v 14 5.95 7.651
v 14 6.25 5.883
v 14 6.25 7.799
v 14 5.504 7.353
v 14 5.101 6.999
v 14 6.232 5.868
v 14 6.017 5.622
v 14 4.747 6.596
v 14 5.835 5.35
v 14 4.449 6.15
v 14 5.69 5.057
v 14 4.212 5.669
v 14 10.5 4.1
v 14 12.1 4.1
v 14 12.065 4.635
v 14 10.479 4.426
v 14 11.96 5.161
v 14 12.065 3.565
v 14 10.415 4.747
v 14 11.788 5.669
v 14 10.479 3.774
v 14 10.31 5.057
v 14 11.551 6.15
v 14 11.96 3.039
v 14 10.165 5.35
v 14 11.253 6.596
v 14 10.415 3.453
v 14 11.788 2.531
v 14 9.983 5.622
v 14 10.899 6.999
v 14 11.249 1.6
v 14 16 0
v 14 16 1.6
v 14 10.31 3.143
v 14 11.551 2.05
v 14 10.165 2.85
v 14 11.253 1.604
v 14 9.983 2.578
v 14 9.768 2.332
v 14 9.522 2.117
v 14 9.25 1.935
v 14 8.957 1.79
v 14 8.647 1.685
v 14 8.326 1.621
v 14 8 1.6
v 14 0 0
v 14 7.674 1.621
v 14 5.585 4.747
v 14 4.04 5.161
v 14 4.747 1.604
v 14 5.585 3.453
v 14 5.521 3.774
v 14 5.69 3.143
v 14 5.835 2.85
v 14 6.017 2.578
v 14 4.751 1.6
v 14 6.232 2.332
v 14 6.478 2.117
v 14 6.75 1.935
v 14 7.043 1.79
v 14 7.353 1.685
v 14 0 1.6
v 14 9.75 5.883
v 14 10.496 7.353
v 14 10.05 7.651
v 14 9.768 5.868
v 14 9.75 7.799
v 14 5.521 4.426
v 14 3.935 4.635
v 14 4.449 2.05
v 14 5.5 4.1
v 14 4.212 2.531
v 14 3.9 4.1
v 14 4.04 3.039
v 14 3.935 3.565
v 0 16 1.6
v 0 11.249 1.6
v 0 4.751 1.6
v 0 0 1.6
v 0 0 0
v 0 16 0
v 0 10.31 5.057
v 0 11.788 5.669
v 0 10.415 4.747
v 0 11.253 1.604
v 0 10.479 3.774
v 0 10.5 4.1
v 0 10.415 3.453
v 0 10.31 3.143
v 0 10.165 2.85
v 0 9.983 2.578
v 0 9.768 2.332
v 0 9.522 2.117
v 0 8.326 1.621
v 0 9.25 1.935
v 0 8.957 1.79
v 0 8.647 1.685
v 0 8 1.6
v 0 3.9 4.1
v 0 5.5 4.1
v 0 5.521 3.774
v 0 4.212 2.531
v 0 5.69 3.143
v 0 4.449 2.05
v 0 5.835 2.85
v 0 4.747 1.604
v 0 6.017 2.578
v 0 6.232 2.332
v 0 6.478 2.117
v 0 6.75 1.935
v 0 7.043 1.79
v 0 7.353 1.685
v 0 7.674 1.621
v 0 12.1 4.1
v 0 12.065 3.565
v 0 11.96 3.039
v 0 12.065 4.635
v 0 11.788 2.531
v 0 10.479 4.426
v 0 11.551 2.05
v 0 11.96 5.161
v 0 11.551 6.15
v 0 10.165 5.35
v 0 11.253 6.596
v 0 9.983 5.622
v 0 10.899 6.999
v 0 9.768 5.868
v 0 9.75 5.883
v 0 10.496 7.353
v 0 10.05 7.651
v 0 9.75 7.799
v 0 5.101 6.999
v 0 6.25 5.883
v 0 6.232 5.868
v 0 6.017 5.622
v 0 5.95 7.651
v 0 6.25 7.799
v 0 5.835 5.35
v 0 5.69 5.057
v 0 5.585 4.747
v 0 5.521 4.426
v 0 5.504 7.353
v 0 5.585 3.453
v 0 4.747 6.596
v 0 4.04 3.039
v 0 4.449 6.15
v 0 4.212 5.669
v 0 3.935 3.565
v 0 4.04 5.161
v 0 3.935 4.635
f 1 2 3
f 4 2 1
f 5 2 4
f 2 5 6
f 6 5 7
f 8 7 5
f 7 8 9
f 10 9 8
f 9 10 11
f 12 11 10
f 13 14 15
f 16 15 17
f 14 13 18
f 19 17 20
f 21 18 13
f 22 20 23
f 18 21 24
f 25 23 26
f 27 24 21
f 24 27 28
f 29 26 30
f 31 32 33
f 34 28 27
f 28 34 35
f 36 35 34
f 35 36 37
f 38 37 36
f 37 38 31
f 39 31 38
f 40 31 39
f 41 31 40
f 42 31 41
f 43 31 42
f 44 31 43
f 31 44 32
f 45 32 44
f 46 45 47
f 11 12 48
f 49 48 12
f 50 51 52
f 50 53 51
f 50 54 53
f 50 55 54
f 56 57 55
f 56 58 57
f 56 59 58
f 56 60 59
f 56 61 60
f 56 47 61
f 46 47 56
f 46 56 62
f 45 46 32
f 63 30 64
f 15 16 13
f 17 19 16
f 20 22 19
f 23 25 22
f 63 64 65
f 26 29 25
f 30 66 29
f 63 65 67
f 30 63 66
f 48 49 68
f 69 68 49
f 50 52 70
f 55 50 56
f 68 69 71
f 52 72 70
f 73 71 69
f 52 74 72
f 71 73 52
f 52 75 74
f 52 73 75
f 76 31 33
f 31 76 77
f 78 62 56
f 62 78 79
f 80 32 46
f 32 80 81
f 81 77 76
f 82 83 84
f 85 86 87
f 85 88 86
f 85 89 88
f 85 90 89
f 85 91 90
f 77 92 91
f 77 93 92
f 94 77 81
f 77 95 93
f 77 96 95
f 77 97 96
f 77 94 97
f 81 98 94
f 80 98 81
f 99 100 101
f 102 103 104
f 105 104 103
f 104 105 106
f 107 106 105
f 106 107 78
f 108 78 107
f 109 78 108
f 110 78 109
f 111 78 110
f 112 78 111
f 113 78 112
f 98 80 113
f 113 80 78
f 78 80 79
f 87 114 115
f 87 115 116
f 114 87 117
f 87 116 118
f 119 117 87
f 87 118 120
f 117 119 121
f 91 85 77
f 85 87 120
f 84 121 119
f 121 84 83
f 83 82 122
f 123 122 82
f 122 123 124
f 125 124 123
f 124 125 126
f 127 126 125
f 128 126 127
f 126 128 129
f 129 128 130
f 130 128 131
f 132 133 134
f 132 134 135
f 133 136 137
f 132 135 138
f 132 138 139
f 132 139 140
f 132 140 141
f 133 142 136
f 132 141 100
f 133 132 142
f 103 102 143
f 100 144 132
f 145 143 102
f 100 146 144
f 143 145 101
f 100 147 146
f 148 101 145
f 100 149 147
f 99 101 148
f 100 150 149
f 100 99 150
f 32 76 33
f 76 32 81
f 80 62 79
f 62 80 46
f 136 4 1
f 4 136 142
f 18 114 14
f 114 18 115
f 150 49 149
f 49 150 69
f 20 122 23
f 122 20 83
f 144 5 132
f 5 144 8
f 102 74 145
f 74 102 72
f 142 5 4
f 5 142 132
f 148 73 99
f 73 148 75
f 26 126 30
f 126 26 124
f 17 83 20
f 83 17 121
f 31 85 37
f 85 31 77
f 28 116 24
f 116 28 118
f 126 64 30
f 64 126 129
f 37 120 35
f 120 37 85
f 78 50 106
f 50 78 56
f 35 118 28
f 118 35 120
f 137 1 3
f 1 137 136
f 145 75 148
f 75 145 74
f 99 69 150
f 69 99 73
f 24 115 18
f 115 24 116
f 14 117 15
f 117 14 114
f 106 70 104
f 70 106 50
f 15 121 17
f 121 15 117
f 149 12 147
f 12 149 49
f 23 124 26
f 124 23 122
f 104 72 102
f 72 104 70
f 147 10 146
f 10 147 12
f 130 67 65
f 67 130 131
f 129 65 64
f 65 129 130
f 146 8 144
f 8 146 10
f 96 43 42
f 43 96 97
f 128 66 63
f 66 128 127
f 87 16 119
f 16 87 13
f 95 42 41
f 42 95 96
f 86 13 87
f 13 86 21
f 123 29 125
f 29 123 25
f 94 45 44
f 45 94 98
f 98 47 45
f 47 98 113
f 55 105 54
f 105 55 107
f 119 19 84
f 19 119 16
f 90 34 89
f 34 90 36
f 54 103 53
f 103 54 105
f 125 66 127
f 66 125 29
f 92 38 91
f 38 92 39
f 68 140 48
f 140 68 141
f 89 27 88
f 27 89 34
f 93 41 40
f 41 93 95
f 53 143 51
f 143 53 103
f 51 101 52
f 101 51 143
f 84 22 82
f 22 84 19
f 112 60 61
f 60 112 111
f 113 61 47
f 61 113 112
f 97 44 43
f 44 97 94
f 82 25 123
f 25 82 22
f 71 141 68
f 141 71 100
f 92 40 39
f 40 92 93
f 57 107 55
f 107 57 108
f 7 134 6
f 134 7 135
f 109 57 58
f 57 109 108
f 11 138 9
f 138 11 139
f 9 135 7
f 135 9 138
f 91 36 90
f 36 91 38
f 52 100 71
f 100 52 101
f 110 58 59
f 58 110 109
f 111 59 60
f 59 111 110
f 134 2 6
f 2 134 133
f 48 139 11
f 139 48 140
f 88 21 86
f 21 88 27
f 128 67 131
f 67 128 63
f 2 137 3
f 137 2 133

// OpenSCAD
// Lead clip: holds the magnet's leads to the bracket with a loop of slack, so the swivel can turn a quarter for
// taps without tugging the wires off the magnet. Two on the bracket, more along the carriage. Taped. Units: mm.

wire_d = 5;        // the two-core lead, or two singles side by side
foot_w = 14;
foot_l = 16;
t      = 1.6;
$fn = 48;

difference() {
    union() {
        cube([foot_w, foot_l, t]);                                              // tape foot
        translate([foot_w / 2, foot_l / 2, t + wire_d / 2]) rotate([0, 90, 0])
            cylinder(d = wire_d + 2 * t, h = foot_w, center = true);
    }
    translate([foot_w / 2, foot_l / 2, t + wire_d / 2]) rotate([0, 90, 0]) cylinder(d = wire_d, h = foot_w + 2, center = true);
    translate([-1, foot_l / 2 - wire_d * 0.35, t + wire_d / 2]) cube([foot_w + 2, wire_d * 0.7, wire_d]);  // snap-in mouth
}
